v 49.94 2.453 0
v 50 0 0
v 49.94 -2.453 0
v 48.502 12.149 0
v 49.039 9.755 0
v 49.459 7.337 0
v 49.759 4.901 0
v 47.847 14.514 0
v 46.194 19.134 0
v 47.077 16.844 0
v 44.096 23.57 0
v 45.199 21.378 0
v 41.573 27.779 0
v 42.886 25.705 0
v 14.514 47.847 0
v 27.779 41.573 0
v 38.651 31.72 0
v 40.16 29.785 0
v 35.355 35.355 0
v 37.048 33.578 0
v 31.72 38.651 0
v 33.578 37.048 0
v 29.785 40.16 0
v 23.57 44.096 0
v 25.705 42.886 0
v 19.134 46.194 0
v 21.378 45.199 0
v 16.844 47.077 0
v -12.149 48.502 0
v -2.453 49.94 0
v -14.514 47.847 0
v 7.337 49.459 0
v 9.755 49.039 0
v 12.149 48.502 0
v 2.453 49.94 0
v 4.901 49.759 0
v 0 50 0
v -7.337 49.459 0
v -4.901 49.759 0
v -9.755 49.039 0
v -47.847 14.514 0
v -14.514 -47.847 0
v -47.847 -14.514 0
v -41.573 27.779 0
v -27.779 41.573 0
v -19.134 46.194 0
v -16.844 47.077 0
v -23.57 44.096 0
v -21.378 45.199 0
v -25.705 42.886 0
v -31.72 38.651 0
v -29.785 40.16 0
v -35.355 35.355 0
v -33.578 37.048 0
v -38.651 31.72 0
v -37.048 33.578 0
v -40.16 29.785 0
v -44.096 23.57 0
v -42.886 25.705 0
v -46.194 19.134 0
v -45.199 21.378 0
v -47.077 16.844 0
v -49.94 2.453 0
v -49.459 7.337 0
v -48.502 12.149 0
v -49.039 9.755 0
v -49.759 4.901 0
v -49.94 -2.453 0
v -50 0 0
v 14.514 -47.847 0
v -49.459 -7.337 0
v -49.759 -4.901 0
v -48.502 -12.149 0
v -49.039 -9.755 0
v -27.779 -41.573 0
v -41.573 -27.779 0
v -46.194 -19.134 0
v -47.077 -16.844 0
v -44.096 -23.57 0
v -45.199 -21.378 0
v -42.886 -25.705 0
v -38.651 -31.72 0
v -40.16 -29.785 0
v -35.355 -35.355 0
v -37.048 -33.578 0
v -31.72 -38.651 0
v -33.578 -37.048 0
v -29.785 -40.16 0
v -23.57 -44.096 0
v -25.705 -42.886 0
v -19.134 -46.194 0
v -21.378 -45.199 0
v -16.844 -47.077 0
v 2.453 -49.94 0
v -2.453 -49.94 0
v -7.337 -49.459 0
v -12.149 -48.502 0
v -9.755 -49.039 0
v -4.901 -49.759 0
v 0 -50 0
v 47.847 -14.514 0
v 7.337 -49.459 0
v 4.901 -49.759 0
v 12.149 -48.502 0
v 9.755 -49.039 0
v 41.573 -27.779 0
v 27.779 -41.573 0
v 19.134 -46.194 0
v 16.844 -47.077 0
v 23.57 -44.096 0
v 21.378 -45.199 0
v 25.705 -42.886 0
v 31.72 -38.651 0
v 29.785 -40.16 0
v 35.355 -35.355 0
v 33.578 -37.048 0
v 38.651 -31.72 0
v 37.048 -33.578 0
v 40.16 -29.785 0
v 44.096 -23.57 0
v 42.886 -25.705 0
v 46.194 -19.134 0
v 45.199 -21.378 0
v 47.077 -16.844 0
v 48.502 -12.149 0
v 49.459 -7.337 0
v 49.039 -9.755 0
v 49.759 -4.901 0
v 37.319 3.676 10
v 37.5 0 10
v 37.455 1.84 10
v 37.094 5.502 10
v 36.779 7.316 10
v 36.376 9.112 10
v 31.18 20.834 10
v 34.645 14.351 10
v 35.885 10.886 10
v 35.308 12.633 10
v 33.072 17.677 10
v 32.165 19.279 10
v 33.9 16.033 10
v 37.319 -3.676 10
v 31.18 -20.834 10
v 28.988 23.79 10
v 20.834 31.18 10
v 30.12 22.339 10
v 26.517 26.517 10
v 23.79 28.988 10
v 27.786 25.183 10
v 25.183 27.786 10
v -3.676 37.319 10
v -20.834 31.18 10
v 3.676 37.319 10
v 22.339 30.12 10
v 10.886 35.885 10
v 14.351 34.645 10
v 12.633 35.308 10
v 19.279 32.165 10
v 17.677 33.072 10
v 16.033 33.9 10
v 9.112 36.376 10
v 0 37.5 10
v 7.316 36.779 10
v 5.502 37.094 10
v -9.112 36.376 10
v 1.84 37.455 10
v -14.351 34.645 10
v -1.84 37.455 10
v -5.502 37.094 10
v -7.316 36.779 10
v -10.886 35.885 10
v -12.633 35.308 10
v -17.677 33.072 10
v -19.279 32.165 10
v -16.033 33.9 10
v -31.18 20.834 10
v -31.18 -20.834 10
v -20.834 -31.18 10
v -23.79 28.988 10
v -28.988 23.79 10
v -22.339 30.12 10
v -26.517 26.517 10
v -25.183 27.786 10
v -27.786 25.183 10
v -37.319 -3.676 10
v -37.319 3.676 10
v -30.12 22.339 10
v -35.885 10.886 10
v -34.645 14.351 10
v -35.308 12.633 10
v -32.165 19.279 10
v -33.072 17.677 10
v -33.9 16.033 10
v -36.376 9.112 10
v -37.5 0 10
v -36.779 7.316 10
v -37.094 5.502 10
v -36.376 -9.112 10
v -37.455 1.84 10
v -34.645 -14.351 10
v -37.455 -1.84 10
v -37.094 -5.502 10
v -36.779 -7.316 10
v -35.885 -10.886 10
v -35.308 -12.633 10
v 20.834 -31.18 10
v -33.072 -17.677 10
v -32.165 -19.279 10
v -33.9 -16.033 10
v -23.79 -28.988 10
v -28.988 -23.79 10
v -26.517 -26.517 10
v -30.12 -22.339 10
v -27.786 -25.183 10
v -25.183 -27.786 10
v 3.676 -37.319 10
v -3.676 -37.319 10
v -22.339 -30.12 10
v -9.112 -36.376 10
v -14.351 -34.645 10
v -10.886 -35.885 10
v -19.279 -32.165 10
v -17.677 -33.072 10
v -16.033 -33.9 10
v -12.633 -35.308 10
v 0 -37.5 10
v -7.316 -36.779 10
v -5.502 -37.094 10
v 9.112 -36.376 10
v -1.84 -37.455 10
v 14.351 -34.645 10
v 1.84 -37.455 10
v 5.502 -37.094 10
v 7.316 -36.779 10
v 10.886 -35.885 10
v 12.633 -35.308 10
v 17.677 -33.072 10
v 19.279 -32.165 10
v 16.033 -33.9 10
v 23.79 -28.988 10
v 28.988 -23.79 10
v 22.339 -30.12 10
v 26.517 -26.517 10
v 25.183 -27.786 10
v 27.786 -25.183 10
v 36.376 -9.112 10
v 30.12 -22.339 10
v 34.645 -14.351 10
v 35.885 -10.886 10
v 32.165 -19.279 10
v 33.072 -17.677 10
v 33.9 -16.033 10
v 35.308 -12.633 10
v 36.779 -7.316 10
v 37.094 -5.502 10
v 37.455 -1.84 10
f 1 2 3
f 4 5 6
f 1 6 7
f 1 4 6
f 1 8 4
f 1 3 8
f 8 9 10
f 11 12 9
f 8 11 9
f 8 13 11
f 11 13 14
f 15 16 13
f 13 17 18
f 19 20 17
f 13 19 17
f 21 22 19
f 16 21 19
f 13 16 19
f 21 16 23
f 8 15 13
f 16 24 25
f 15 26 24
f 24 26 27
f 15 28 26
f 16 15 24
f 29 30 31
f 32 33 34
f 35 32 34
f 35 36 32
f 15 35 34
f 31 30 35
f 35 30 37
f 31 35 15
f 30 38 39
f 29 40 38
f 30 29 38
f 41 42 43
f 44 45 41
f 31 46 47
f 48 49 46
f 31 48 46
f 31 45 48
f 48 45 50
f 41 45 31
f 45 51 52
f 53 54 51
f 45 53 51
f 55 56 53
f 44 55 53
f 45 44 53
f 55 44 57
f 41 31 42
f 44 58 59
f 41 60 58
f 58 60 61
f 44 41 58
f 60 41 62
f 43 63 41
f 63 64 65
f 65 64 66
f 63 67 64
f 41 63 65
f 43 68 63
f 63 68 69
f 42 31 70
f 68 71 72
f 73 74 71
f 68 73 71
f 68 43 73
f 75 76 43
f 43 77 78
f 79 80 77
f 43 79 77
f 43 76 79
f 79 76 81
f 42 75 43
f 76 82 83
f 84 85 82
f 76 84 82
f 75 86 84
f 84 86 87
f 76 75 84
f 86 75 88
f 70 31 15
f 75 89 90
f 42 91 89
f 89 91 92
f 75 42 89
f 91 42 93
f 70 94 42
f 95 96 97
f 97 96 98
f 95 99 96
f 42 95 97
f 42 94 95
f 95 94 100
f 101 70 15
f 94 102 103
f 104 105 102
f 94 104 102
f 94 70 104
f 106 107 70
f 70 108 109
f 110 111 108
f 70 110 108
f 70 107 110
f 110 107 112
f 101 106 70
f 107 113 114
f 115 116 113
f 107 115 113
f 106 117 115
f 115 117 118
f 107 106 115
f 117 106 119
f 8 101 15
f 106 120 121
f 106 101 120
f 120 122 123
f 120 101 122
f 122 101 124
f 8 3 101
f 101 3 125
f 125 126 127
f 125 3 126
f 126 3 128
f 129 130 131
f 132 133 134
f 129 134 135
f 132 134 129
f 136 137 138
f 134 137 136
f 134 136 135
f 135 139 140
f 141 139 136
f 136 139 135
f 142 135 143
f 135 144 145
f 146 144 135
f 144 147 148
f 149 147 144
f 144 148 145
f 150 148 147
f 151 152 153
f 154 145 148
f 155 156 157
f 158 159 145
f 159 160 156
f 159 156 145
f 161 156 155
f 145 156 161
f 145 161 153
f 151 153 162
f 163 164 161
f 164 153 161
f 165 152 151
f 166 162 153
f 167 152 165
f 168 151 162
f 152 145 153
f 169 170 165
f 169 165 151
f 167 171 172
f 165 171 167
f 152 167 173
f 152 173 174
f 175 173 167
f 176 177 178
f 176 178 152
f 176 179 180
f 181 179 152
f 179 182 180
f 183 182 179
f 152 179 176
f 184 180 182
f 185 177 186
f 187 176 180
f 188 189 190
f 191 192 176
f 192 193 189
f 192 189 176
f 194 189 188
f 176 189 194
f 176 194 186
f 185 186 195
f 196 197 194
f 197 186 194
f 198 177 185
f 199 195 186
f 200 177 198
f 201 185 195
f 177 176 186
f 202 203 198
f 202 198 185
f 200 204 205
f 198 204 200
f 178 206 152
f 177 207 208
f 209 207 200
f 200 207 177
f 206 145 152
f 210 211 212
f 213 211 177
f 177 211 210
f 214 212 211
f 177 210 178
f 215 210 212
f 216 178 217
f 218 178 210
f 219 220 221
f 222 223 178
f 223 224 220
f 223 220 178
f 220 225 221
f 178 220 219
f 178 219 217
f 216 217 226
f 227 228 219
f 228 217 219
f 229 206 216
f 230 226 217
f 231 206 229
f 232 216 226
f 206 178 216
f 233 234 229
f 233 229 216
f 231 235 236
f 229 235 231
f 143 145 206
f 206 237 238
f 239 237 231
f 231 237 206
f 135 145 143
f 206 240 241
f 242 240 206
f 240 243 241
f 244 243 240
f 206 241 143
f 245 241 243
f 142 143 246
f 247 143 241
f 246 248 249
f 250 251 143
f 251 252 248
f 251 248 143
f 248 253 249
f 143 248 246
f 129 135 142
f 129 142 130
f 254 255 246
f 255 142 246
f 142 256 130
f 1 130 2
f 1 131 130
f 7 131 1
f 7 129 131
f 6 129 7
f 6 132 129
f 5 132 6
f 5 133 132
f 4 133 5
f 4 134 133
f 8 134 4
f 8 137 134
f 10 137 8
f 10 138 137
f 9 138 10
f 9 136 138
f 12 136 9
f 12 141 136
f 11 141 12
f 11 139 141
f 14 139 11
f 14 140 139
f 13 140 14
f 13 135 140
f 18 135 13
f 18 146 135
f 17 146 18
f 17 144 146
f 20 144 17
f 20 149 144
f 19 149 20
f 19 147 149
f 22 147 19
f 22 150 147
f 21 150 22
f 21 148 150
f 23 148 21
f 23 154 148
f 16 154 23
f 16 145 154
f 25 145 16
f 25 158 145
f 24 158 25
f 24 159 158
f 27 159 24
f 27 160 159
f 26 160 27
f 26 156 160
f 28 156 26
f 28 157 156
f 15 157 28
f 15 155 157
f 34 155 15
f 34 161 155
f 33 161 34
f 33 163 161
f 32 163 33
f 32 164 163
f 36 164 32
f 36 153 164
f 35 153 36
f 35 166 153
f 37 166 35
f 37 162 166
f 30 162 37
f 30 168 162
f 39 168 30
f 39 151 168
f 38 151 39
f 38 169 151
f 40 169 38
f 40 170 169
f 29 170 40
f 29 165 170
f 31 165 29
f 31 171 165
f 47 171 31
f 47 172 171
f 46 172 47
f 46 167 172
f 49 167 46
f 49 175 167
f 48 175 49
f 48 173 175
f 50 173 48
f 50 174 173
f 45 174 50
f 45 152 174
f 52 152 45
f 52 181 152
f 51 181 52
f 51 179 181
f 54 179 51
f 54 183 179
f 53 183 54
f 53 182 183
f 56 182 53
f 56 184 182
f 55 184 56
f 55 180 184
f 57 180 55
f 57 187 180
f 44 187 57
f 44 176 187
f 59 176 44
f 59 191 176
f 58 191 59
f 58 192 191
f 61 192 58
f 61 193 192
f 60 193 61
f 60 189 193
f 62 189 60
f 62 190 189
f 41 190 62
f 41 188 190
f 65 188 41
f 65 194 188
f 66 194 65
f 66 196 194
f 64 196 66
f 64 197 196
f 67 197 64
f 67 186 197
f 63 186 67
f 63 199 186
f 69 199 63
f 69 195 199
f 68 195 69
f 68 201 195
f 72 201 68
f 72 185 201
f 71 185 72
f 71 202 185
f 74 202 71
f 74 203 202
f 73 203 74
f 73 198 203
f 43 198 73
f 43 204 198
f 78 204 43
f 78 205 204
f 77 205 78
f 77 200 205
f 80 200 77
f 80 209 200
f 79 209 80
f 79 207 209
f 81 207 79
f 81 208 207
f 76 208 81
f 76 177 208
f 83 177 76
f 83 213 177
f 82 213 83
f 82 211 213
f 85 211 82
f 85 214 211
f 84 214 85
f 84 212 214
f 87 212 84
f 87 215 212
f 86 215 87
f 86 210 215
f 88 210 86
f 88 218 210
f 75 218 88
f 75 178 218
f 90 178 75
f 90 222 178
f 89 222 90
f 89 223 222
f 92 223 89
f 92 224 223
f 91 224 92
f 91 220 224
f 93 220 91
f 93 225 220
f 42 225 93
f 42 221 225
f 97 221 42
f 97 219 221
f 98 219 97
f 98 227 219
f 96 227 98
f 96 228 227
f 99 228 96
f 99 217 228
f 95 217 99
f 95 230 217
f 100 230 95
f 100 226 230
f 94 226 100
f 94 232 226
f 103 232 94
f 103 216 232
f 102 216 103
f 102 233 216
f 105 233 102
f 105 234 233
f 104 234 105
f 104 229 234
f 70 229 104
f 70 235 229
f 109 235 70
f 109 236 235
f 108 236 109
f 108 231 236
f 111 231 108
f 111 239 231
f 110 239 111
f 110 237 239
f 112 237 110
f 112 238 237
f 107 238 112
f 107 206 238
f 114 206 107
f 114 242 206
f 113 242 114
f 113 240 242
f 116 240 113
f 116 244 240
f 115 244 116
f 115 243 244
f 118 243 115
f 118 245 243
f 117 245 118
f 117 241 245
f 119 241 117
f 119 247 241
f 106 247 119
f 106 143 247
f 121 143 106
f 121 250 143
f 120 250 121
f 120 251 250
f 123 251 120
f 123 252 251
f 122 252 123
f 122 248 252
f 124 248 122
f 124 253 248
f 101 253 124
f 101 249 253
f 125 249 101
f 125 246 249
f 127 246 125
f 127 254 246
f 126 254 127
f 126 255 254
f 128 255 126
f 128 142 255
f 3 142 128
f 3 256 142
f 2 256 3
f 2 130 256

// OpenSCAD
// file: canal.scad
module canal_side (width, height, length, bottom_opening, top_opening, top_opening_height, angle) {
    extrude_scale = top_opening / bottom_opening;
    difference() {
        cube([width, length, height]);
        union() {
            translate([0, 0, height - top_opening_height])
                linear_extrude(height = top_opening_height, scale = ( 1 / extrude_scale ) * 0.75)
                    square([top_opening, length]);
            linear_extrude(height = height - top_opening_height, scale = extrude_scale)
                square([bottom_opening, length * ( 1 / extrude_scale )]);
        }

        // Front cutout
        rotate([-angle, 0, 0])
            translate([0, -length, 0])
                cube([width, length, height * 2]);

        // Side cutout
        translate([width, 0, 0])
            rotate([0, -angle / 1.25, 0])
                cube([length, length, length * 2]);
    }
}

module canal (canal_width = 10, canal_height = 3, canal_length = 5, bottom_opening = 4, top_opening = 1, top_opening_height = 1.4, canal_angle = 30) {
    rotate([0, 0, -90]) {
        canal_side(
            width = canal_width / 2,
            height = canal_height,
            length = canal_length,
            bottom_opening = bottom_opening / 2,
            top_opening = top_opening / 2,
            top_opening_height = top_opening_height,
            angle = canal_angle
        );
        mirror([1, 0, 0])
            canal_side(
                width = canal_width / 2,
                height = canal_height,
                length = canal_length,
                bottom_opening = bottom_opening / 2,
                top_opening = top_opening / 2,
                top_opening_height = top_opening_height,
                angle = canal_angle
            );
    }
}
// file: center-piece.scad
module center_piece (height = 5, bottom_radius = 3, top_radius = 5, cap_height = 0.4) {
    main_height = height - cap_height;
    cylinder(r1 = bottom_radius, r2 = top_radius, h = main_height);
    translate([0, 0, main_height])
        cylinder(r = top_radius, h = cap_height);
}
// main file
/* SIDES = 7;

include <center-piece.scad>
include <canal.scad>

module polygon(sides = SIDES, side_width = 15, thickness = 1.2, total_height = 5) {
    // calculations: https://www-formula.ru/lengthpartiesisoscelestriangle
    side_angle = 360 / sides;
    center_piece_height = total_height - thickness;
    radius = side_width / ( 2 * sin( side_angle / 2 ) );
    side_distance_from_center = sqrt( pow( radius, 2 ) - pow( side_width / 2, 2 ) );
    rotate([ 0, 0, ( 1 - sides % 2 ) * side_angle / 2 ])
        linear_extrude(thickness)
            circle(r=radius, $fn=sides);
    translate([0, 0, thickness])
        center_piece(height = center_piece_height, top_radius = 4.7);

    for(i = [0:sides - 1]) {
        rotate([0, 0, i * side_angle])
            translate([-side_distance_from_center, 0, thickness])
                canal(canal_width = side_width / 1.75, canal_length = radius / 4, canal_angle = 36, top_opening = 0.4, canal_height = 3);
    }

}

polygon(); */

linear_extrude(height=10, scale=0.75)
    circle(r=50, $fn = 128);
